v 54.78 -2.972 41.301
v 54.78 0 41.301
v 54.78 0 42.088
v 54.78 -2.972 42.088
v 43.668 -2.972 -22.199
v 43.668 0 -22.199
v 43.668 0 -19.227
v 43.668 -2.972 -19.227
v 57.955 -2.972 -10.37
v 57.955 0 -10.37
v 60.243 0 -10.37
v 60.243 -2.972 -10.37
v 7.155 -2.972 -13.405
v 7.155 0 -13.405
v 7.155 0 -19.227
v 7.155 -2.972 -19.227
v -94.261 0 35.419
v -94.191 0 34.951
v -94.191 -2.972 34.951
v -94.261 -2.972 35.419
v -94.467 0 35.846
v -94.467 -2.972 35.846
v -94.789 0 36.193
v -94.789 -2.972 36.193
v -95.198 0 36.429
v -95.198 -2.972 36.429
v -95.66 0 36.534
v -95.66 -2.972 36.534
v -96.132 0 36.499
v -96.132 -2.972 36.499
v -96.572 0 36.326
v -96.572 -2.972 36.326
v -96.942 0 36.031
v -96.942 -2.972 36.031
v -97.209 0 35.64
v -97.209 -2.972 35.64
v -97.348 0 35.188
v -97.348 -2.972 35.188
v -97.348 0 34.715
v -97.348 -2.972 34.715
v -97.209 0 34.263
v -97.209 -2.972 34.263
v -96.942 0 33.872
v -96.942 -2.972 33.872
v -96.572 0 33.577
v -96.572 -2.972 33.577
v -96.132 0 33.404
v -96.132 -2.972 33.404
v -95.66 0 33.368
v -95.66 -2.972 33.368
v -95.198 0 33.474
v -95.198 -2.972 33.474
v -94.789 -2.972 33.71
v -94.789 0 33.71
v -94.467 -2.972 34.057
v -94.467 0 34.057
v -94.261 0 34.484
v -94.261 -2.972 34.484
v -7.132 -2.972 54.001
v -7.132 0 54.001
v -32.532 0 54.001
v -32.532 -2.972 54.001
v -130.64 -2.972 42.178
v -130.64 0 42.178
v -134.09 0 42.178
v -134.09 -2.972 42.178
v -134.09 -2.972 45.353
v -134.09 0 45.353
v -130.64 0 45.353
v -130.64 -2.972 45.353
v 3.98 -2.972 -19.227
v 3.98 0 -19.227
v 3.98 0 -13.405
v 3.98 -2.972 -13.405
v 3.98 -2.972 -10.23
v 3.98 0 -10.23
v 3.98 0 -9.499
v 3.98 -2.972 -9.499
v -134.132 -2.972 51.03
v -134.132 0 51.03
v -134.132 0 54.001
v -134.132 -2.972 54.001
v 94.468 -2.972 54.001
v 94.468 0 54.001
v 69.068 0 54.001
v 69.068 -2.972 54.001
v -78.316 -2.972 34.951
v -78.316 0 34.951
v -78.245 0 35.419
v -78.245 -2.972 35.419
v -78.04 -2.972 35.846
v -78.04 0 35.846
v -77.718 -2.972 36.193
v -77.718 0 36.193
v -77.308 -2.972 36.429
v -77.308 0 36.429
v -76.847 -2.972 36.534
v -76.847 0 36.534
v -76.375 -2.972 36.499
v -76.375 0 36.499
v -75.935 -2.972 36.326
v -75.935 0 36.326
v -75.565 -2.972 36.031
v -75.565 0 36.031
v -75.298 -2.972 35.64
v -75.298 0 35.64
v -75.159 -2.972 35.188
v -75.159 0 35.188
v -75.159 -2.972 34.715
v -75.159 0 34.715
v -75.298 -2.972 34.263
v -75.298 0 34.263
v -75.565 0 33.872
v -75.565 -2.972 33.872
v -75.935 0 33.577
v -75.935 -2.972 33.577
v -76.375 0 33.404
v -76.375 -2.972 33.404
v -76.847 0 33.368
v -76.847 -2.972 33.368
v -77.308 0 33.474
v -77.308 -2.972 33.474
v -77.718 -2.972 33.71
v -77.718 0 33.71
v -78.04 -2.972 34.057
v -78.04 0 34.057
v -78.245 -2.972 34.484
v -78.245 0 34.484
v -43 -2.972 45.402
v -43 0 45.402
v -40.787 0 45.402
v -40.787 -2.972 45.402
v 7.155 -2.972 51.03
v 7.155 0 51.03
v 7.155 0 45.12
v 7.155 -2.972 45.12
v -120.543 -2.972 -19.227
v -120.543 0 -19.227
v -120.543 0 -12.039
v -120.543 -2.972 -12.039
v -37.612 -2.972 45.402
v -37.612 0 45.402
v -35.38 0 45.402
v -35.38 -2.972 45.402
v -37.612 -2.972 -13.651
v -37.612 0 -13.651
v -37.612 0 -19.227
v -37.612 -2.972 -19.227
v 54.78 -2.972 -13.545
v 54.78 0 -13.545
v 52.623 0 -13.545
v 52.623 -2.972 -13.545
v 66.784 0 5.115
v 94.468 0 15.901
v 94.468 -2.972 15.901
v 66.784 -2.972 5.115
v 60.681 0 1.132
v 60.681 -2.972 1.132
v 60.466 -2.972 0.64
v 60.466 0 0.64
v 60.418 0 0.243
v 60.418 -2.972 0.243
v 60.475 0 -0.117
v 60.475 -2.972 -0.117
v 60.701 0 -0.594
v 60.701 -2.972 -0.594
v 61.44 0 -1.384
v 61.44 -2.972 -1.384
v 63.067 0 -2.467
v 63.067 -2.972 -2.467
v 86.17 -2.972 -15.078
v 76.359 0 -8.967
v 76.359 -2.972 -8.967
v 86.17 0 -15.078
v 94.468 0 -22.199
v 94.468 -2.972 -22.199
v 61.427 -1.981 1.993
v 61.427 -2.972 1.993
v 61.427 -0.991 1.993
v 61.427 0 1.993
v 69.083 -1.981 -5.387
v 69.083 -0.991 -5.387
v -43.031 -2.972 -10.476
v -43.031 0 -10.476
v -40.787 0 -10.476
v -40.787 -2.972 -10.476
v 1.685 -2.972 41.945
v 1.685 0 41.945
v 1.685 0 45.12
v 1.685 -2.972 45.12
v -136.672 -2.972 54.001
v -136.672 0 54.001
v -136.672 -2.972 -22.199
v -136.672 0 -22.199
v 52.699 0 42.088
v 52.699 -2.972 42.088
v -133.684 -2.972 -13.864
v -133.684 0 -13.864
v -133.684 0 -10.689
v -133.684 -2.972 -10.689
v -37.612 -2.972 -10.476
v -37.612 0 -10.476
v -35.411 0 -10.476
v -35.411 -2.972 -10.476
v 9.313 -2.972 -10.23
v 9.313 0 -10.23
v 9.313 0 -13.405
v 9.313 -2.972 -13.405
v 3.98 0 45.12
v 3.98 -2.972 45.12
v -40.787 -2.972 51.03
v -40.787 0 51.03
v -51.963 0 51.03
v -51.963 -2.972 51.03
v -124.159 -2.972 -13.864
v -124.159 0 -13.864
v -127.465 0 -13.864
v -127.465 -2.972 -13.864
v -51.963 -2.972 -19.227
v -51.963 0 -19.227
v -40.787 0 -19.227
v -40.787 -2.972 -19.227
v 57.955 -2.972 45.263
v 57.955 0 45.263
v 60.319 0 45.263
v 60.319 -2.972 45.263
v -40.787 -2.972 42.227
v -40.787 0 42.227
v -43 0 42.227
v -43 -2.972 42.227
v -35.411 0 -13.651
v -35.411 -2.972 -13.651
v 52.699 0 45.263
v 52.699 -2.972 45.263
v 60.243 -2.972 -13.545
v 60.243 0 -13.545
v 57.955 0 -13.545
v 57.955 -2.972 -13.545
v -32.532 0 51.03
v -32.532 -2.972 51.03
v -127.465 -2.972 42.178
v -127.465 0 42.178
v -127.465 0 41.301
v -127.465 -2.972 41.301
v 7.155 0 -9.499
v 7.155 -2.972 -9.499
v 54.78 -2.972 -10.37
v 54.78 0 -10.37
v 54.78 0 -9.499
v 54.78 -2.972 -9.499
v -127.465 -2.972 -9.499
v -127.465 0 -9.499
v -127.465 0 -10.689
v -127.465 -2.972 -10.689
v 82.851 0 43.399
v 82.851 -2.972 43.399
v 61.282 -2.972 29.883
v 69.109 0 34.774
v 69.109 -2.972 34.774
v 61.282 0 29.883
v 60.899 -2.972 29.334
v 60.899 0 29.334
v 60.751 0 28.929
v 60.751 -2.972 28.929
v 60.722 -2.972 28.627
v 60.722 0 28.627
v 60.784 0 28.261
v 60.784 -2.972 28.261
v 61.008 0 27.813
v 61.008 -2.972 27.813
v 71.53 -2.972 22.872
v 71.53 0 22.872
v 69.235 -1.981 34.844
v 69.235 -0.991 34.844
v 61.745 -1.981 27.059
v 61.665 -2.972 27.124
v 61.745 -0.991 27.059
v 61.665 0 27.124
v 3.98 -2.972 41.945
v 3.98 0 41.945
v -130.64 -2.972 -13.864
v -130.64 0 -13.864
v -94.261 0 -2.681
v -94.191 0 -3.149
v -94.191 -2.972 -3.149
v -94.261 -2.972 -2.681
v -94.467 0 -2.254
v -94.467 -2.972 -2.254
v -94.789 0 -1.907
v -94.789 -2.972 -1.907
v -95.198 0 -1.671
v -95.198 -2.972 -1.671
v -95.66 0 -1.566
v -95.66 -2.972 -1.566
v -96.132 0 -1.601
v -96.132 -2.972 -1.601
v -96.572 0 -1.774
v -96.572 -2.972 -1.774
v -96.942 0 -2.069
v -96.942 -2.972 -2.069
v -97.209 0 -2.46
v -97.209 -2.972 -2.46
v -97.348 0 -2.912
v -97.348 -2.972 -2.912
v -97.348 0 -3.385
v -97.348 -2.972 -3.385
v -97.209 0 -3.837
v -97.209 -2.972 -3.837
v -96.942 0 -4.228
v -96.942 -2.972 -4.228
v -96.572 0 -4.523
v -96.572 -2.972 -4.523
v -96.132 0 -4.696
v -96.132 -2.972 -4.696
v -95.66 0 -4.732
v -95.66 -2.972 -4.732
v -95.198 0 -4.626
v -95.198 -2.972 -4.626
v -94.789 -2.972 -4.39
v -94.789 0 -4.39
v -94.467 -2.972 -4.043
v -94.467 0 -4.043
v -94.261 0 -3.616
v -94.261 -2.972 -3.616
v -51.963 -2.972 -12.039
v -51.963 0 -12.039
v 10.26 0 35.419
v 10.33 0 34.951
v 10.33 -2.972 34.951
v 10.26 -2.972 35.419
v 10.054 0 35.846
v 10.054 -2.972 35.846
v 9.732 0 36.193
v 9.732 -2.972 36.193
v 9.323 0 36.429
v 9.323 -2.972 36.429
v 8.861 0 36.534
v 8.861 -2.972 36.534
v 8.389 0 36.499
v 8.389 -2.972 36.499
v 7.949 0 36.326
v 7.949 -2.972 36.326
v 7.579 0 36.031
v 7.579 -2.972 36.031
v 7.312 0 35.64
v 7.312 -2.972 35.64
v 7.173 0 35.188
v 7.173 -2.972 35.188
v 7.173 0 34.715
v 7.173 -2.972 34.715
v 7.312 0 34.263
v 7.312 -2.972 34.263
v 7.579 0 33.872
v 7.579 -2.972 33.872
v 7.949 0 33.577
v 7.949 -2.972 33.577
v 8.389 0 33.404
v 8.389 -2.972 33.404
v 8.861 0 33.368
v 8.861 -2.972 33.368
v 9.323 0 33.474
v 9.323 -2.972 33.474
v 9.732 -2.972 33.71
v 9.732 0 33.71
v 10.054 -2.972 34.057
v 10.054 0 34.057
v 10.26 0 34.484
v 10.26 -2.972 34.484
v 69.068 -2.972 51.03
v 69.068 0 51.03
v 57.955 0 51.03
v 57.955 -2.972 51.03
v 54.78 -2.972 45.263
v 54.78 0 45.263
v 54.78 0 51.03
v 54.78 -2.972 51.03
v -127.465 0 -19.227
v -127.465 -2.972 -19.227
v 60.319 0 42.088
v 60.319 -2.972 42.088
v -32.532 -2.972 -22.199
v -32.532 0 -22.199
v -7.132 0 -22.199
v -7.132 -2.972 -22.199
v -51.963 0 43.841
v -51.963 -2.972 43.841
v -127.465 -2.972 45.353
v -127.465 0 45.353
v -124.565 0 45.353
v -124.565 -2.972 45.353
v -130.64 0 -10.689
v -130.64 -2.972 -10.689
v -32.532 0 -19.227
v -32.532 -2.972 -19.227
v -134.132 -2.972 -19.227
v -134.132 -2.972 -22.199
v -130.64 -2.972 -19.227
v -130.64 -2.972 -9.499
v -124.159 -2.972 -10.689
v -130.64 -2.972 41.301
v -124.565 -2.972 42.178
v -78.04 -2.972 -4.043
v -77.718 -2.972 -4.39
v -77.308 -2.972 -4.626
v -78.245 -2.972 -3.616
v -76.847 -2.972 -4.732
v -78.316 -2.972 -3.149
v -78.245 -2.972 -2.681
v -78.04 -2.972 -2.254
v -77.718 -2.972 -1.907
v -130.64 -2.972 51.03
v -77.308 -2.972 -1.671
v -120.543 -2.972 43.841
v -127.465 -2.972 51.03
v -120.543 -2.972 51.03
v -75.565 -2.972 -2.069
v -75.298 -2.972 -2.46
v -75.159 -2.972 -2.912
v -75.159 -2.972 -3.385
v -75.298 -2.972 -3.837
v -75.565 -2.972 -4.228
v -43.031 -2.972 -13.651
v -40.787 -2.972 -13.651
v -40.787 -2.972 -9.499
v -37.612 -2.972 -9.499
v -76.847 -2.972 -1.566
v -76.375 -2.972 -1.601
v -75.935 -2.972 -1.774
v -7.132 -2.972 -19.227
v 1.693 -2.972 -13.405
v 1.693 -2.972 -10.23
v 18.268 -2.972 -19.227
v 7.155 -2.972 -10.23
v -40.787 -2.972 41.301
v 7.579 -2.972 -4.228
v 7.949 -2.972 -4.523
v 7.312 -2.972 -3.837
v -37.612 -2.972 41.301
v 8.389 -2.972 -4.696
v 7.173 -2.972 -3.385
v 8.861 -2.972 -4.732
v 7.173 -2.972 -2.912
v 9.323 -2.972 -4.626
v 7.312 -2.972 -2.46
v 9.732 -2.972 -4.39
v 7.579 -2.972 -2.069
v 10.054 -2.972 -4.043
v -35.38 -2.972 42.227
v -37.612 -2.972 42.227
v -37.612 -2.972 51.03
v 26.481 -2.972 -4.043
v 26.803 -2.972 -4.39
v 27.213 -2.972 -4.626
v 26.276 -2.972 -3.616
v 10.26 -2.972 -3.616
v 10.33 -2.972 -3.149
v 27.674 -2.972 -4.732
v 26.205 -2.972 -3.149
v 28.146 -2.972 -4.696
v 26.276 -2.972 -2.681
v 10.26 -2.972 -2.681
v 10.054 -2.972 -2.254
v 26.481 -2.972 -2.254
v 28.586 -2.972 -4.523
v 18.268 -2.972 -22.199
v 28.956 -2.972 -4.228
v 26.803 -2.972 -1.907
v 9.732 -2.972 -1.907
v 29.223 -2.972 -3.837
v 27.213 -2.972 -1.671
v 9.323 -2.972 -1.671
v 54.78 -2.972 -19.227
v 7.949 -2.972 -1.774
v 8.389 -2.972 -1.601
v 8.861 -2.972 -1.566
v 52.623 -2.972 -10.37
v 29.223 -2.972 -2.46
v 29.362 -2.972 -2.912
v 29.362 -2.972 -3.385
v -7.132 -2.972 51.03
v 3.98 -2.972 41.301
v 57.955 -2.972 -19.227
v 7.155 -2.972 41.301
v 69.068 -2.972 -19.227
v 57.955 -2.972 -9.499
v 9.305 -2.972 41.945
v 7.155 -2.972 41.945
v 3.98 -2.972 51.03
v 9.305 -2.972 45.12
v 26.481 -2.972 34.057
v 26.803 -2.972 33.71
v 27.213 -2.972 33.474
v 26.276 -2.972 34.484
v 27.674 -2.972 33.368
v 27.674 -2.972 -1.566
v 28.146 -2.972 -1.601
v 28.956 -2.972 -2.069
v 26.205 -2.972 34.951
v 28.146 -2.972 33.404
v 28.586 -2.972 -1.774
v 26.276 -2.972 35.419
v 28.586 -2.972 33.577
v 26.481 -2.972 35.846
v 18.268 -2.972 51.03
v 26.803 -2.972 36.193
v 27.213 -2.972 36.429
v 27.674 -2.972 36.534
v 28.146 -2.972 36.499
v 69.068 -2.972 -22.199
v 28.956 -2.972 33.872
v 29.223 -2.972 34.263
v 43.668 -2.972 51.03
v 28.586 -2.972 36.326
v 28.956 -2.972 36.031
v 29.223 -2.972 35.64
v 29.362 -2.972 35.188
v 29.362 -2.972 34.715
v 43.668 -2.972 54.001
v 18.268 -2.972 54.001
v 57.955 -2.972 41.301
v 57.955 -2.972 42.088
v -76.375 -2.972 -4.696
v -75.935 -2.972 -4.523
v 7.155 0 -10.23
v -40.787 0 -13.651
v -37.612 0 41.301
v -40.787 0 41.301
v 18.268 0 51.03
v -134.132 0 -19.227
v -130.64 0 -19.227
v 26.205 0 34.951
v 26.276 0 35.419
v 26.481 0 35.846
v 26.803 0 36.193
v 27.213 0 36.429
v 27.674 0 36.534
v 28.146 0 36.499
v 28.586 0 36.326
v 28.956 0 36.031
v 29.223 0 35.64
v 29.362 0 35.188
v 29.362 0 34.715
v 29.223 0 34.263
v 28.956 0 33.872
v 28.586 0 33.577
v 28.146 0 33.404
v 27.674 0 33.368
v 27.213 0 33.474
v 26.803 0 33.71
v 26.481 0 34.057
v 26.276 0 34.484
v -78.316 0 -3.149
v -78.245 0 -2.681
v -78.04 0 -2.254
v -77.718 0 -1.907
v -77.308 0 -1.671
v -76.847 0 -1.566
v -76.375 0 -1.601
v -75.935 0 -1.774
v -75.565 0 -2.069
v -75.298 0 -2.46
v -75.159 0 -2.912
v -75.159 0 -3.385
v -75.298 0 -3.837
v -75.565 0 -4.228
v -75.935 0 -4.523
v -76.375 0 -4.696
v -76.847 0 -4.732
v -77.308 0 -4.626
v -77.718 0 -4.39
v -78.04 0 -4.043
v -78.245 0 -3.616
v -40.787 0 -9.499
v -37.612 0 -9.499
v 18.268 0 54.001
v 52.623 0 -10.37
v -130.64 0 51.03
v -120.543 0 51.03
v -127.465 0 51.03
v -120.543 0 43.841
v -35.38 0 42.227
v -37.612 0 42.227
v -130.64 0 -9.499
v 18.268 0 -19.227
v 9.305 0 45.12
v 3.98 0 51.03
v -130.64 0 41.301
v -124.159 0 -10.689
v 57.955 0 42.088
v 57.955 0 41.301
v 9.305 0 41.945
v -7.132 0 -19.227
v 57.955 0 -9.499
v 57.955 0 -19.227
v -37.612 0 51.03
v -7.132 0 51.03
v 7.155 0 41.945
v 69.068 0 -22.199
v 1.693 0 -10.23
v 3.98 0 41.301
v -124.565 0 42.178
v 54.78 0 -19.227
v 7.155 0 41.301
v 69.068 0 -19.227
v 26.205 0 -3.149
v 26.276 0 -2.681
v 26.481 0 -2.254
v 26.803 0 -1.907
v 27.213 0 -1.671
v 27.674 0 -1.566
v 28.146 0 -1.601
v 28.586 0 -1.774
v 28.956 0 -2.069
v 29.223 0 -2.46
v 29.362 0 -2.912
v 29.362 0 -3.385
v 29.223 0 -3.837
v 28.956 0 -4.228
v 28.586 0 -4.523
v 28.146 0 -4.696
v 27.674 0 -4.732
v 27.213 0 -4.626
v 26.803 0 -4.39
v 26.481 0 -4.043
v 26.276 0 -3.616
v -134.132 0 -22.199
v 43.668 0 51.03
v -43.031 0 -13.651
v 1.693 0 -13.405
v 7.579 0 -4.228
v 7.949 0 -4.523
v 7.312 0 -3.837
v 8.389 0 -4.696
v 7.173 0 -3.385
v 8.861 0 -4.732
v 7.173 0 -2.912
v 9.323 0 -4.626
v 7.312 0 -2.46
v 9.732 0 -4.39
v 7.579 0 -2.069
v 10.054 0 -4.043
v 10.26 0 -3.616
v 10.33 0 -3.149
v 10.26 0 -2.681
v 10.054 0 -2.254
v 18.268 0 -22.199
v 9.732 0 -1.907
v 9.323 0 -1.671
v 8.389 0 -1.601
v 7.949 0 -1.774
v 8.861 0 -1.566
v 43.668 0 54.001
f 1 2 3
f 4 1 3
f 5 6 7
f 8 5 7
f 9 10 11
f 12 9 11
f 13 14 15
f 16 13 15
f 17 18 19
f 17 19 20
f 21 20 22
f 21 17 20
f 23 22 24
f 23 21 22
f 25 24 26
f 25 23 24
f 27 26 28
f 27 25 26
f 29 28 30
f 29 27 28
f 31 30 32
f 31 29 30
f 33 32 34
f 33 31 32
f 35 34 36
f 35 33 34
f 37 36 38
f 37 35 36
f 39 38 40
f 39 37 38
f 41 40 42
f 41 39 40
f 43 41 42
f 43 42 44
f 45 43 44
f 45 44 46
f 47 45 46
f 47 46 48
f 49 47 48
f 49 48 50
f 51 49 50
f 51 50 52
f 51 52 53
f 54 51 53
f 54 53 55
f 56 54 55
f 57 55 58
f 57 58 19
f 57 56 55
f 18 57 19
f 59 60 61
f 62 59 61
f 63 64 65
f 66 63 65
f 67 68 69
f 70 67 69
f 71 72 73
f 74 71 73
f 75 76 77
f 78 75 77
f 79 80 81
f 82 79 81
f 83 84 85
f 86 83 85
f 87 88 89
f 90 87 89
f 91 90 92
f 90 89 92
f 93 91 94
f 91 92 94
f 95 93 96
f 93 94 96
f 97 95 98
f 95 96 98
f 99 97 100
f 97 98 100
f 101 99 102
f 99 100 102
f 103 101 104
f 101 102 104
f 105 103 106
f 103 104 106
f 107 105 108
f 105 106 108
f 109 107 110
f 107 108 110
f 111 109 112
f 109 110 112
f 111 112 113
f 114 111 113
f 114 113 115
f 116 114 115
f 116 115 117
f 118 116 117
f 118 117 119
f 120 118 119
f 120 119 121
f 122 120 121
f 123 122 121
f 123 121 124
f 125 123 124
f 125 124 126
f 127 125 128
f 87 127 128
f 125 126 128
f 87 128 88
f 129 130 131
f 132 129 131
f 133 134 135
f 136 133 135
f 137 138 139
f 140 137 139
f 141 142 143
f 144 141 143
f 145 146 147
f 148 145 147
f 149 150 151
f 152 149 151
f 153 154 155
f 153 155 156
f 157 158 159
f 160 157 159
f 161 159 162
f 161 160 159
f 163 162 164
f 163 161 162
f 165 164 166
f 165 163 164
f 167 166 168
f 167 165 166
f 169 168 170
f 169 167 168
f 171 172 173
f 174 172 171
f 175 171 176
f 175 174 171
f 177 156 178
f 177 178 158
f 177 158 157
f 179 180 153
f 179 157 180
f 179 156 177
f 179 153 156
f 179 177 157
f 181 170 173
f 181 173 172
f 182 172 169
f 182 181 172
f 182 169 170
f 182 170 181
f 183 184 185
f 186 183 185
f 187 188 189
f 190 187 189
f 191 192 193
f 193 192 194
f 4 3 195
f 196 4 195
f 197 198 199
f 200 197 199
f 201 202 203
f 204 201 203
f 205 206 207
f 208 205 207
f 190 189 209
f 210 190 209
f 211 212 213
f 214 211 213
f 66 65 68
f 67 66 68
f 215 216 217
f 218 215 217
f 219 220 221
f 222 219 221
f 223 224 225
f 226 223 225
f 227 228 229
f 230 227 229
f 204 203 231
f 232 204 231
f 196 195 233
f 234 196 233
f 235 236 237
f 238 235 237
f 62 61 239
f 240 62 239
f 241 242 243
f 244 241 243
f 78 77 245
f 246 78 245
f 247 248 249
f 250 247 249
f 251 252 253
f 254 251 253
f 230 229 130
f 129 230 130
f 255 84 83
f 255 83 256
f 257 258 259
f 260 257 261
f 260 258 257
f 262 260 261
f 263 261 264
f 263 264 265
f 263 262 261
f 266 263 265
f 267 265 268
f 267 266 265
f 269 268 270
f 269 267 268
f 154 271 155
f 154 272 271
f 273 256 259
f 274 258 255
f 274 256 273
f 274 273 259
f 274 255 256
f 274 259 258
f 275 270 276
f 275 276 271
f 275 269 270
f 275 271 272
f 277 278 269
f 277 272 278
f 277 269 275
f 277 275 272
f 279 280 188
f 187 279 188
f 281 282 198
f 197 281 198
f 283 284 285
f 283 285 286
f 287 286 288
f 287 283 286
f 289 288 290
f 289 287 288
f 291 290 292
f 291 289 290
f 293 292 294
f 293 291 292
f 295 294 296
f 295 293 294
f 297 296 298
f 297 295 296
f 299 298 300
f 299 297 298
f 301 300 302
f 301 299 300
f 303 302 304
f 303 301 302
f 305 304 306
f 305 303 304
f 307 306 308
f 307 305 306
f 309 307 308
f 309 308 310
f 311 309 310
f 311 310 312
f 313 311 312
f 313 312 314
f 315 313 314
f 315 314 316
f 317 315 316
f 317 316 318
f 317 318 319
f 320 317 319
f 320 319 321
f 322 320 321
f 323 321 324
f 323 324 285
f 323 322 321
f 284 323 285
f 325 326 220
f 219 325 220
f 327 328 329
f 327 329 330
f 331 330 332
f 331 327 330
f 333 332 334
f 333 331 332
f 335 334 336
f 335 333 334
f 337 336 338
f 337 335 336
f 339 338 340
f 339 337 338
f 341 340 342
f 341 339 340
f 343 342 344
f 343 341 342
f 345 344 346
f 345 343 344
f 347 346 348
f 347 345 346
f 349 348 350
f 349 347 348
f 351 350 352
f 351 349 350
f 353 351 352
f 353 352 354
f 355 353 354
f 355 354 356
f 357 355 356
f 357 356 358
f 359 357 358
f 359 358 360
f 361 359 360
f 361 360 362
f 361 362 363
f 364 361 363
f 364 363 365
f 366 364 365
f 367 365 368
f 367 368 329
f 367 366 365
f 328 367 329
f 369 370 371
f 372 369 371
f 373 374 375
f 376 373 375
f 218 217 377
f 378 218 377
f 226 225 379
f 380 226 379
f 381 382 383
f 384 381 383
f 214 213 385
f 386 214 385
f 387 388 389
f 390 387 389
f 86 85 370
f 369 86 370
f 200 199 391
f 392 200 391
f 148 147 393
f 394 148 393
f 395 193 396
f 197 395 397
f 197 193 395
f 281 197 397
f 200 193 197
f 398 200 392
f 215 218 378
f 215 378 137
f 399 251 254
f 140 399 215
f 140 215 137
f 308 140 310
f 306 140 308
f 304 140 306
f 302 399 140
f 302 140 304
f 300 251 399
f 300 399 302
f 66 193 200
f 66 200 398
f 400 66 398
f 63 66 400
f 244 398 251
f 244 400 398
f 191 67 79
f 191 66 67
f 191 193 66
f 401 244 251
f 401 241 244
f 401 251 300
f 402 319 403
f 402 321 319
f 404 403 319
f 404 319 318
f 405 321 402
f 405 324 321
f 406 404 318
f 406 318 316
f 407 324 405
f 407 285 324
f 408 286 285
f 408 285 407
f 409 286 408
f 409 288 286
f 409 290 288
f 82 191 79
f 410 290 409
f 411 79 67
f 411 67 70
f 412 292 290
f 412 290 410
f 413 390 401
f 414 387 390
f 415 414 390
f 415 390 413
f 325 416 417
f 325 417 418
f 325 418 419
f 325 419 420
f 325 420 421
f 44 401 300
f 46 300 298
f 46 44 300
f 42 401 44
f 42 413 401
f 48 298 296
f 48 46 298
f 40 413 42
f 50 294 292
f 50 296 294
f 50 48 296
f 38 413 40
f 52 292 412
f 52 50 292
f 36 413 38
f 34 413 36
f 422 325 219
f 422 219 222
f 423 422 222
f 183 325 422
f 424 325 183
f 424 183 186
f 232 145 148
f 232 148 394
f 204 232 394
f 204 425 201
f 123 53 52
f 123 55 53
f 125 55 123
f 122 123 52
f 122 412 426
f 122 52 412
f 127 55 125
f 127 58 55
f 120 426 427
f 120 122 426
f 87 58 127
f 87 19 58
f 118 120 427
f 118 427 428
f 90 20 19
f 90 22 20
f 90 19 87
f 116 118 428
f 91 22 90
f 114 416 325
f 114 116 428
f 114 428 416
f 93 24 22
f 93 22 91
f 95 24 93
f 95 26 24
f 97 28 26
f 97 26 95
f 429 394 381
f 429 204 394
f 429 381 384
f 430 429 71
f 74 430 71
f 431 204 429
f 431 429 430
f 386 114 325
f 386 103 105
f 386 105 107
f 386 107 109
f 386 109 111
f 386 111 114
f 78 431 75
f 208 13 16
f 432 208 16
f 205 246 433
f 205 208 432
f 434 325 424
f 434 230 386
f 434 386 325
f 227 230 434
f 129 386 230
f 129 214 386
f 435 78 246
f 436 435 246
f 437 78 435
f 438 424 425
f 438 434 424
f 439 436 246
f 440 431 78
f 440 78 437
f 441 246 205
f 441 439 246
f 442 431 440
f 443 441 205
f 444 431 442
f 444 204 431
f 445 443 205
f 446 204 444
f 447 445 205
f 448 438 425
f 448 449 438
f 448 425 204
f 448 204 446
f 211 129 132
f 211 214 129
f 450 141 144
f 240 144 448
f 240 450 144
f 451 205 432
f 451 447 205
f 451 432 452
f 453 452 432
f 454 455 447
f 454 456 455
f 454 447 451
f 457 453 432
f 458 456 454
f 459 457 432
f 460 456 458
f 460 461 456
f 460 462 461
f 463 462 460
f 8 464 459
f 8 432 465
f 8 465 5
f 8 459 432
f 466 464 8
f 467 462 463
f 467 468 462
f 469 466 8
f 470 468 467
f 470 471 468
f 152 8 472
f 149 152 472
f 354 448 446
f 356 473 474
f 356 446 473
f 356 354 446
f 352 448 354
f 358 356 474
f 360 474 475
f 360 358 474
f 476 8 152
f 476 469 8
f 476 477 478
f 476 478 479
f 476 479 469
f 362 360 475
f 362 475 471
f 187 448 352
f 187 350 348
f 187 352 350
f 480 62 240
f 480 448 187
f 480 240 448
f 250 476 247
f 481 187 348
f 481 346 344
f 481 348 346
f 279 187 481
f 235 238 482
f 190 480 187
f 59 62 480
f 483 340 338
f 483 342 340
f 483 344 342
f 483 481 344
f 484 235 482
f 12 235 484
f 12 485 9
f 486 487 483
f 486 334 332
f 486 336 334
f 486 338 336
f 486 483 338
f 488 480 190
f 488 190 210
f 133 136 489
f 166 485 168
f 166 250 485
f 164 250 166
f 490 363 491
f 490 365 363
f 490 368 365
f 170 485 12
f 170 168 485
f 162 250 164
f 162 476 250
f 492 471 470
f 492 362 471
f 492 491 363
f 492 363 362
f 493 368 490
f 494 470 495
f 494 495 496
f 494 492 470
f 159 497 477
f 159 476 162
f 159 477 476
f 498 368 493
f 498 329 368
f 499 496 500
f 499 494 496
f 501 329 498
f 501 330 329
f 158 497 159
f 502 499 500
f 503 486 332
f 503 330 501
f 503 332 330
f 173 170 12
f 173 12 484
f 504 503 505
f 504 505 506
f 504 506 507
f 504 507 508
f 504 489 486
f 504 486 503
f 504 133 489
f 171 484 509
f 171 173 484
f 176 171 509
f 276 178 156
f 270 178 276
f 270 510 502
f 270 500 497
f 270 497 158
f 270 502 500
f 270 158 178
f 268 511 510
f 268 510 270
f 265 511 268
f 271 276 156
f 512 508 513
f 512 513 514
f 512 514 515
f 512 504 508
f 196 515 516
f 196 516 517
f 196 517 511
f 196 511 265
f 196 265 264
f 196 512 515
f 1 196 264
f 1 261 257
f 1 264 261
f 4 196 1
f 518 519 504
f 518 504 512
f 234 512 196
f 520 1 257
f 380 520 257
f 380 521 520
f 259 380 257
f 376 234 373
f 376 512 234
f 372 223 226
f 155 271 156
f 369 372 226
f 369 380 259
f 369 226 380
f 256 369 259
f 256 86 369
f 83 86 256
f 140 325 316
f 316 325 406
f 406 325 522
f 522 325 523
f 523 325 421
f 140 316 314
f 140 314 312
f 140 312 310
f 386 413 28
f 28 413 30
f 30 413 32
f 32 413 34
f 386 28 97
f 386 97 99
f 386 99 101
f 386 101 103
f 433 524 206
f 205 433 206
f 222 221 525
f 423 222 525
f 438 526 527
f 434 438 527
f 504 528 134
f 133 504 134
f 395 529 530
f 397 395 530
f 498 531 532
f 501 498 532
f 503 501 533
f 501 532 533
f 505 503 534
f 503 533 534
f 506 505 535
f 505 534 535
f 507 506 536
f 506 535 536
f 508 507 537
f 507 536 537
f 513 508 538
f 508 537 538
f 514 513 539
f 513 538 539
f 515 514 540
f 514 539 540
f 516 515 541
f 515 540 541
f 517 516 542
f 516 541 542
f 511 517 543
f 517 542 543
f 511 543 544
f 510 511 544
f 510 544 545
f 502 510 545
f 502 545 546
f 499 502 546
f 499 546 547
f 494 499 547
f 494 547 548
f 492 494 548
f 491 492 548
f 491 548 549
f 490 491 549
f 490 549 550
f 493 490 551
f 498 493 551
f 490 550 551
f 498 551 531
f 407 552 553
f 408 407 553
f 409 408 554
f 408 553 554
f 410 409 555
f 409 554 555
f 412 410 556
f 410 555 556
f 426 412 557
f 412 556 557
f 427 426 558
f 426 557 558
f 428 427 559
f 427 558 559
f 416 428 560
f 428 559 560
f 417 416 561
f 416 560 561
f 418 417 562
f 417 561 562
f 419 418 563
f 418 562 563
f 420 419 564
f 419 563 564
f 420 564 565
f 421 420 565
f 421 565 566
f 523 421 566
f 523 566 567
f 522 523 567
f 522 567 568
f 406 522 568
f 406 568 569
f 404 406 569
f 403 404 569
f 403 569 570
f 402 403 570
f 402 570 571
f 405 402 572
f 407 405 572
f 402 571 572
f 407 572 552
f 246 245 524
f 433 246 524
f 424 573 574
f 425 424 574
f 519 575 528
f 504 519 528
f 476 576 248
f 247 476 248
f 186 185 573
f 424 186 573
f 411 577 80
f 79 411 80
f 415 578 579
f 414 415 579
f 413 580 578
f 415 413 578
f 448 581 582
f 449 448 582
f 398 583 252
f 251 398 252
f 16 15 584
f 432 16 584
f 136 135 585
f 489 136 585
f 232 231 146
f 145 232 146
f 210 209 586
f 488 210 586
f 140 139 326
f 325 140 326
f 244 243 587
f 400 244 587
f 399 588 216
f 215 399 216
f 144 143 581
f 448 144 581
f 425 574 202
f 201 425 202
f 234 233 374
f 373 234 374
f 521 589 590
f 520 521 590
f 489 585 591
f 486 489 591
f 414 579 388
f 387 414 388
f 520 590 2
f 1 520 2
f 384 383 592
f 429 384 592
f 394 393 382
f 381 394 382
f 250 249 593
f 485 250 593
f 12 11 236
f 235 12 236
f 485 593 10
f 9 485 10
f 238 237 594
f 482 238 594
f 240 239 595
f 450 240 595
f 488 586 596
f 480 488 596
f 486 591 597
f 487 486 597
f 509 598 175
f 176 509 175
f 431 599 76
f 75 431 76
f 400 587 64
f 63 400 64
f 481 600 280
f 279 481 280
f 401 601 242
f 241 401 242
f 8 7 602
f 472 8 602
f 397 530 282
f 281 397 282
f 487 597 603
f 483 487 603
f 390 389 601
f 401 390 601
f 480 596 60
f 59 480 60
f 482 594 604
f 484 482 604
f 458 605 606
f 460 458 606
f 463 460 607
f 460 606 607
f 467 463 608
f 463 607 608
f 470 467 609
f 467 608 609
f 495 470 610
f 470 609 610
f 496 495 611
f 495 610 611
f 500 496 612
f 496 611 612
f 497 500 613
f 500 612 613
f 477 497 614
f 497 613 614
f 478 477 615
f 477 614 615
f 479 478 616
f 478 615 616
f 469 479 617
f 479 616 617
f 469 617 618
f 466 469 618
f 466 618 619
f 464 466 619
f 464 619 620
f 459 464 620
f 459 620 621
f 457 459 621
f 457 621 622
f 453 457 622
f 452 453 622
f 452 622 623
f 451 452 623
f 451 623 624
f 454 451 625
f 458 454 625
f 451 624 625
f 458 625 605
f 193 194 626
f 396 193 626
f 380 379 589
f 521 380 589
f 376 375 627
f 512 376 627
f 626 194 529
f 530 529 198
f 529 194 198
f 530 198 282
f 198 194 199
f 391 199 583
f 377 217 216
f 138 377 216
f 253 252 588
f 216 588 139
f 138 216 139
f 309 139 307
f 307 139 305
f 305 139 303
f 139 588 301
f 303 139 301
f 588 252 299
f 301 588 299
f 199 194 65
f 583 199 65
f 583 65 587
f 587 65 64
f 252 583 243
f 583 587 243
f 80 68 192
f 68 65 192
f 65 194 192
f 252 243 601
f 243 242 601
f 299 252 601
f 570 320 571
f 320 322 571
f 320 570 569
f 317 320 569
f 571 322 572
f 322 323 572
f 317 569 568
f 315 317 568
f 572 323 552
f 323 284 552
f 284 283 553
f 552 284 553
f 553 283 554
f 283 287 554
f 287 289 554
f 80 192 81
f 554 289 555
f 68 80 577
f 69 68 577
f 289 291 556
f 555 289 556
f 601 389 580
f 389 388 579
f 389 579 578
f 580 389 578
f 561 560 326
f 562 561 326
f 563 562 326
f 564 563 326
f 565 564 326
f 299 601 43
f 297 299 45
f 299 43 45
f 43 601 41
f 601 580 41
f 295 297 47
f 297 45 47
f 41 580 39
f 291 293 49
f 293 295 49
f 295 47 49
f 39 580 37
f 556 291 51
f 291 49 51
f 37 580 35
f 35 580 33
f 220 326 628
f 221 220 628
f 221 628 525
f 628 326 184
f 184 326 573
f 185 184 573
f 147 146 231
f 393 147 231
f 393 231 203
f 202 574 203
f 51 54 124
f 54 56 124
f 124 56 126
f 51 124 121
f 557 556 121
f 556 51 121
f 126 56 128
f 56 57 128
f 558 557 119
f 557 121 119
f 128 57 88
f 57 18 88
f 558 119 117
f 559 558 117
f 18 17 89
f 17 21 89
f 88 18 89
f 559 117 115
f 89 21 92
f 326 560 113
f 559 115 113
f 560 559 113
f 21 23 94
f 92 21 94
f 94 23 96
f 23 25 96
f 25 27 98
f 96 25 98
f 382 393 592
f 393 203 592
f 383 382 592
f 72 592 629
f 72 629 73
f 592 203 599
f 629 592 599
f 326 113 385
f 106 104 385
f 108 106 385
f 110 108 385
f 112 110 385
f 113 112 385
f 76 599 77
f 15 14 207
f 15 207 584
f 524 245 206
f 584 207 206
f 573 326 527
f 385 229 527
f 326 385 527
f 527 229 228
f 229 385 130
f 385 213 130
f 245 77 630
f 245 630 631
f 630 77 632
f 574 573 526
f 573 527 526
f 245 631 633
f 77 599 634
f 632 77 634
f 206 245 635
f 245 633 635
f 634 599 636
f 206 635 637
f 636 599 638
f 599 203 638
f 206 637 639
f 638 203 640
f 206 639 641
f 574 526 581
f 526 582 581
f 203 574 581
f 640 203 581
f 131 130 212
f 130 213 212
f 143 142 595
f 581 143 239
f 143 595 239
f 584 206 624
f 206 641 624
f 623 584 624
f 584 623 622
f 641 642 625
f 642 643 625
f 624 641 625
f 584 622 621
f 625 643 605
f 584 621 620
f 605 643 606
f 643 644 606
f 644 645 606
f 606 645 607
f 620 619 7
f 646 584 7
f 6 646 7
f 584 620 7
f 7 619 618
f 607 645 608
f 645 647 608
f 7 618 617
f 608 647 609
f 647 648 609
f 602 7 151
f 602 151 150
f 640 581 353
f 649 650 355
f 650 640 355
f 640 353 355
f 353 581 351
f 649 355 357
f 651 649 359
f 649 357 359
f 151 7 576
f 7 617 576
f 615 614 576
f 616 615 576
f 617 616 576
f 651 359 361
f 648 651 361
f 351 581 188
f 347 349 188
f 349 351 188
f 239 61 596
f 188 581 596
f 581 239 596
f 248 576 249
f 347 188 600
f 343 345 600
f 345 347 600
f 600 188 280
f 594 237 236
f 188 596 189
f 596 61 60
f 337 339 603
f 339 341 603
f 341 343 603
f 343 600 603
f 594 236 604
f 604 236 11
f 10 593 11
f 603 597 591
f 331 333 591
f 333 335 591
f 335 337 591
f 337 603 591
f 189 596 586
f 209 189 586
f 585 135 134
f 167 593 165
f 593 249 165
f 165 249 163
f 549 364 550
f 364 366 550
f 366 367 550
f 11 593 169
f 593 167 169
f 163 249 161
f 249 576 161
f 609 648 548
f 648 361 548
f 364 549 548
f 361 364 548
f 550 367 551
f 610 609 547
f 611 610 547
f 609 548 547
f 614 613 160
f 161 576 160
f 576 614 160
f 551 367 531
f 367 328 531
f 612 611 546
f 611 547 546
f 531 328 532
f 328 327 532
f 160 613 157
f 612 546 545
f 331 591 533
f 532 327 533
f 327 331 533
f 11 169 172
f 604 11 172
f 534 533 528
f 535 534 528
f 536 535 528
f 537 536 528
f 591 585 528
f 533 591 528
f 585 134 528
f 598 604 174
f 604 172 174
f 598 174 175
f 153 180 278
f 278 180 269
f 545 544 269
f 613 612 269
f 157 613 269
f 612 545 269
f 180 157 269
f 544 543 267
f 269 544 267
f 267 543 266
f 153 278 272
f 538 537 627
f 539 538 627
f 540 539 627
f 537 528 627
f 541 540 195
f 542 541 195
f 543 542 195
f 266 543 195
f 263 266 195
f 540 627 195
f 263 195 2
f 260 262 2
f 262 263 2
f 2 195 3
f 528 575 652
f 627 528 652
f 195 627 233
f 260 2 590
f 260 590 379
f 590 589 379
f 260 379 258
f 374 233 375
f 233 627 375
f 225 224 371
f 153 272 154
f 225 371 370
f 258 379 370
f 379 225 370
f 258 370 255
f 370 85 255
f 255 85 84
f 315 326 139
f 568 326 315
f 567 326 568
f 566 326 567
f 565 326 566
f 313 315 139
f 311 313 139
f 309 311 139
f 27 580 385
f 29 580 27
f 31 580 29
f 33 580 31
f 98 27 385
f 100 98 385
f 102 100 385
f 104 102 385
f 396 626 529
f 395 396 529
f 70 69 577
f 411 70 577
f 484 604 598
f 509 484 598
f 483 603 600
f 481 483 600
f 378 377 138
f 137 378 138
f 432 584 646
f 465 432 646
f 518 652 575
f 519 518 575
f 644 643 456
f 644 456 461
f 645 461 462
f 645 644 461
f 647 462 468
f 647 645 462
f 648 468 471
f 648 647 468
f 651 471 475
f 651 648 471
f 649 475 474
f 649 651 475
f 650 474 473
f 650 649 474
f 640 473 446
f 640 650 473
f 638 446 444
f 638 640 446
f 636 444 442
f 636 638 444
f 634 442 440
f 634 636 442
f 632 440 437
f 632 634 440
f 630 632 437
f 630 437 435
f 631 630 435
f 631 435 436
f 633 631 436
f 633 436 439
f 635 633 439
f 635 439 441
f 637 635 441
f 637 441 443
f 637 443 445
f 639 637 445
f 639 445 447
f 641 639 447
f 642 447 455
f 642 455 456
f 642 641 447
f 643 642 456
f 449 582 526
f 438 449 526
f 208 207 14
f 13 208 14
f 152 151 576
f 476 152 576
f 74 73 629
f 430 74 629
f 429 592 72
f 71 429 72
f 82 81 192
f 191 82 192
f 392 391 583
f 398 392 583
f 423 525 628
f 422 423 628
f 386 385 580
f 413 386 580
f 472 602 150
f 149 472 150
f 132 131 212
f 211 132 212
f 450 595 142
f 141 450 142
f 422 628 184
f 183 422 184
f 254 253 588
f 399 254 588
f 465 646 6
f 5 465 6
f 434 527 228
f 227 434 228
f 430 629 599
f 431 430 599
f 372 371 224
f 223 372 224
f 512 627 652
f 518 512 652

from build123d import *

# Parameters (mm, degrees)
F0_R     = 1.5875
F0_W     = 159.1020785272
F0_H     = 25.4
F1_DEPTH = 2.9718


# Not quite as in the source:
# - a feature names something its author has since deleted; it is built from what else it names


with BuildPart() as f1:
    # F0 (on Front) → F1 (new body)
    with BuildSketch(Plane.XZ):
        Polygon((-134.1324669933, 51.0296365122), (-134.1324669933, 54.0014365122), (-136.6724669933, 54.0014365122), (-136.6724669933, -22.1985634878), (-134.1324669933, -22.1985634878), (-134.1324669933, -19.2267634878), align=None)
        with BuildLine():
            Line((-130.6399669933, 51.0296365122), (-134.1324669933, 51.0296365122))
            Line((-134.1324669933, 51.0296365122), (-134.1324669933, -19.2267634878))
            Line((-134.1324669933, -19.2267634878), (-130.6399669933, -19.2267634878))
            Line((-130.6399669933, -19.2267634878), (-130.6399669933, -13.8642910361))
            Line((-130.6399669933, -13.8642910361), (-133.683725667, -13.8642910361))
            Line((-133.683725667, -13.8642910361), (-133.683725667, -10.6892910361))
            Line((-133.683725667, -10.6892910361), (-130.6399669933, -10.6892910361))
            Line((-130.6399669933, -10.6892910361), (-130.6399669933, -9.4985634878))
            Line((-130.6399669933, -9.4985634878), (-127.4649669933, -9.4985634878))
            Line((-127.4649669933, -9.4985634878), (-127.4649669933, -10.6892910361))
            Line((-127.4649669933, -10.6892910361), (-124.158725667, -10.6892910361))
            Line((-124.158725667, -10.6892910361), (-124.158725667, -13.8642910361))
            Line((-124.158725667, -13.8642910361), (-127.4649669933, -13.8642910361))
            Line((-127.4649669933, -13.8642910361), (-127.4649669933, -19.2267634878))
            Line((-127.4649669933, -19.2267634878), (-120.5434669933, -19.2267634878))
            Line((-120.5434669933, -19.2267634878), (-120.5434669933, -12.0385634878))
            Line((-120.5434669933, -12.0385634878), (-51.9634669933, -12.0385634878))
            Line((-51.9634669933, -12.0385634878), (-51.9634669933, -19.2267634878))
            Line((-51.9634669933, -19.2267634878), (-40.7874669933, -19.2267634878))
            Line((-40.7874669933, -19.2267634878), (-40.7874669933, -13.650716418))
            Line((-40.7874669933, -13.650716418), (-43.0311936414, -13.650716418))
            Line((-43.0311936414, -13.650716418), (-43.0311936414, -10.475716418))
            Line((-43.0311936414, -10.475716418), (-40.7874669933, -10.475716418))
            Line((-40.7874669933, -10.475716418), (-40.7874669933, -9.4985634878))
            Line((-40.7874669933, -9.4985634878), (-37.6124669933, -9.4985634878))
            Line((-37.6124669933, -9.4985634878), (-37.6124669933, -10.475716418))
            Line((-37.6124669933, -10.475716418), (-35.4111936414, -10.475716418))
            Line((-35.4111936414, -10.475716418), (-35.4111936414, -13.650716418))
            Line((-35.4111936414, -13.650716418), (-37.6124669933, -13.650716418))
            Line((-37.6124669933, -13.650716418), (-37.6124669933, -19.2267634878))
            Line((-37.6124669933, -19.2267634878), (-32.5324669933, -19.2267634878))
            Line((-32.5324669933, -19.2267634878), (-32.5324669933, -22.1985634878))
            Line((-32.5324669933, -22.1985634878), (-7.1324669933, -22.1985634878))
            Line((-7.1324669933, -22.1985634878), (-7.1324669933, -19.2267634878))
            Line((-7.1324669933, -19.2267634878), (3.9800330067, -19.2267634878))
            Line((3.9800330067, -19.2267634878), (3.9800330067, -13.4051909164))
            Line((3.9800330067, -13.4051909164), (1.6932926612, -13.4051909164))
            Line((1.6932926612, -13.4051909164), (1.6932926612, -10.2301909164))
            Line((1.6932926612, -10.2301909164), (3.9800330067, -10.2301909164))
            Line((3.9800330067, -10.2301909164), (3.9800330067, -9.4985634878))
            Line((3.9800330067, -9.4985634878), (7.1550330067, -9.4985634878))
            Line((7.1550330067, -9.4985634878), (7.1550330067, -10.2301909164))
            Line((7.1550330067, -10.2301909164), (9.3132926612, -10.2301909164))
            Line((9.3132926612, -10.2301909164), (9.3132926612, -13.4051909164))
            Line((9.3132926612, -13.4051909164), (7.1550330067, -13.4051909164))
            Line((7.1550330067, -13.4051909164), (7.1550330067, -19.2267634878))
            Line((7.1550330067, -19.2267634878), (18.2675330067, -19.2267634878))
            Line((18.2675330067, -19.2267634878), (18.2675330067, -22.1985634878))
            Line((18.2675330067, -22.1985634878), (43.6675330067, -22.1985634878))
            Line((43.6675330067, -22.1985634878), (43.6675330067, -19.2267634878))
            Line((43.6675330067, -19.2267634878), (54.7800330067, -19.2267634878))
            Line((54.7800330067, -19.2267634878), (54.7800330067, -13.545062393))
            Line((54.7800330067, -13.545062393), (52.6228938252, -13.545062393))
            Line((52.6228938252, -13.545062393), (52.6228938252, -10.370062393))
            Line((52.6228938252, -10.370062393), (54.7800330067, -10.370062393))
            Line((54.7800330067, -10.370062393), (54.7800330067, -9.4985634878))
            Line((54.7800330067, -9.4985634878), (57.9550330067, -9.4985634878))
            Line((57.9550330067, -9.4985634878), (57.9550330067, -10.370062393))
            Line((57.9550330067, -10.370062393), (60.2428938252, -10.370062393))
            Line((60.2428938252, -10.370062393), (60.2428938252, -13.545062393))
            Line((60.2428938252, -13.545062393), (57.9550330067, -13.545062393))
            Line((57.9550330067, -13.545062393), (57.9550330067, -19.2267634878))
            Line((57.9550330067, -19.2267634878), (69.0675330067, -19.2267634878))
            Line((69.0675330067, -19.2267634878), (69.0675330067, -22.1985634878))
            Line((69.0675330067, -22.1985634878), (94.4675330067, -22.1985634878))
            add(Edge.make_bspline(
                [(94.4675330067, 15.9014365122), (33.4221309805, -6.5926179945), (67.8742191577, 4.6496394366), (94.4675330067, -22.1985634878)],
                knots=[0, 0, 0, 0, 38.1, 38.1, 38.1, 38.1], degree=3))
            add(Edge.make_bspline(
                [(94.4675330067, 54.0014365122), (67.8547954941, 24.2413681328), (34.147437551, 33.6619180903), (94.4675330067, 15.9014365122)],
                knots=[0, 0, 0, 0, 38.1, 38.1, 38.1, 38.1], degree=3))
            Line((94.4675330067, 54.0014365122), (69.0675330067, 54.0014365122))
            Line((69.0675330067, 54.0014365122), (69.0675330067, 51.0296365122))
            Line((69.0675330067, 51.0296365122), (57.9550330067, 51.0296365122))
            Line((57.9550330067, 51.0296365122), (57.9550330067, 45.263365978))
            Line((57.9550330067, 45.263365978), (60.3188354051, 45.263365978))
            Line((60.3188354051, 45.263365978), (60.3188354051, 42.088365978))
            Line((60.3188354051, 42.088365978), (57.9550330067, 42.088365978))
            Line((57.9550330067, 42.088365978), (57.9550330067, 41.3014365122))
            Line((57.9550330067, 41.3014365122), (54.7800330067, 41.3014365122))
            Line((54.7800330067, 41.3014365122), (54.7800330067, 42.088365978))
            Line((54.7800330067, 42.088365978), (52.6988354051, 42.088365978))
            Line((52.6988354051, 42.088365978), (52.6988354051, 45.263365978))
            Line((52.6988354051, 45.263365978), (54.7800330067, 45.263365978))
            Line((54.7800330067, 45.263365978), (54.7800330067, 51.0296365122))
            Line((54.7800330067, 51.0296365122), (43.6675330067, 51.0296365122))
            Line((43.6675330067, 51.0296365122), (43.6675330067, 54.0014365122))
            Line((43.6675330067, 54.0014365122), (18.2675330067, 54.0014365122))
            Line((18.2675330067, 54.0014365122), (18.2675330067, 51.0296365122))
            Line((18.2675330067, 51.0296365122), (7.1550330067, 51.0296365122))
            Line((7.1550330067, 51.0296365122), (7.1550330067, 45.1199758291))
            Line((7.1550330067, 45.1199758291), (9.3046905002, 45.1199758291))
            Line((9.3046905002, 45.1199758291), (9.3046905002, 41.9449758291))
            Line((9.3046905002, 41.9449758291), (7.1550330067, 41.9449758291))
            Line((7.1550330067, 41.9449758291), (7.1550330067, 41.3014365122))
            Line((7.1550330067, 41.3014365122), (3.9800330067, 41.3014365122))
            Line((3.9800330067, 41.3014365122), (3.9800330067, 41.9449758291))
            Line((3.9800330067, 41.9449758291), (1.6846905002, 41.9449758291))
            Line((1.6846905002, 41.9449758291), (1.6846905002, 45.1199758291))
            Line((1.6846905002, 45.1199758291), (3.9800330067, 45.1199758291))
            Line((3.9800330067, 45.1199758291), (3.9800330067, 51.0296365122))
            Line((3.9800330067, 51.0296365122), (-7.1324669933, 51.0296365122))
            Line((-7.1324669933, 51.0296365122), (-7.1324669933, 54.0014365122))
            Line((-7.1324669933, 54.0014365122), (-32.5324669933, 54.0014365122))
            Line((-32.5324669933, 54.0014365122), (-32.5324669933, 51.0296365122))
            Line((-32.5324669933, 51.0296365122), (-37.6124669933, 51.0296365122))
            Line((-37.6124669933, 51.0296365122), (-37.6124669933, 45.4024068505))
            Line((-37.6124669933, 45.4024068505), (-35.3795323992, 45.4024068505))
            Line((-35.3795323992, 45.4024068505), (-35.3795323992, 42.2274068505))
            Line((-35.3795323992, 42.2274068505), (-37.6124669933, 42.2274068505))
            Line((-37.6124669933, 42.2274068505), (-37.6124669933, 41.3014365122))
            Line((-37.6124669933, 41.3014365122), (-40.7874669933, 41.3014365122))
            Line((-40.7874669933, 41.3014365122), (-40.7874669933, 42.2274068505))
            Line((-40.7874669933, 42.2274068505), (-42.9995323992, 42.2274068505))
            Line((-42.9995323992, 42.2274068505), (-42.9995323992, 45.4024068505))
            Line((-42.9995323992, 45.4024068505), (-40.7874669933, 45.4024068505))
            Line((-40.7874669933, 45.4024068505), (-40.7874669933, 51.0296365122))
            Line((-40.7874669933, 51.0296365122), (-51.9634669933, 51.0296365122))
            Line((-51.9634669933, 51.0296365122), (-51.9634669933, 43.8414365122))
            Line((-51.9634669933, 43.8414365122), (-120.5434669933, 43.8414365122))
            Line((-120.5434669933, 43.8414365122), (-120.5434669933, 51.0296365122))
            Line((-120.5434669933, 51.0296365122), (-127.4649669933, 51.0296365122))
            Line((-127.4649669933, 51.0296365122), (-127.4649669933, 45.3533373266))
            Line((-127.4649669933, 45.3533373266), (-124.5652367949, 45.3533373266))
            Line((-124.5652367949, 45.3533373266), (-124.5652367949, 42.1783373266))
            Line((-124.5652367949, 42.1783373266), (-127.4649669933, 42.1783373266))
            Line((-127.4649669933, 42.1783373266), (-127.4649669933, 41.3014365122))
            Line((-127.4649669933, 41.3014365122), (-130.6399669933, 41.3014365122))
            Line((-130.6399669933, 41.3014365122), (-130.6399669933, 42.1783373266))
            Line((-130.6399669933, 42.1783373266), (-134.0902367949, 42.1783373266))
            Line((-134.0902367949, 42.1783373266), (-134.0902367949, 45.3533373266))
            Line((-134.0902367949, 45.3533373266), (-130.6399669933, 45.3533373266))
            Line((-130.6399669933, 45.3533373266), (-130.6399669933, 51.0296365122))
        make_face()
        with Locations((-95.7784669933, -3.1485634878)):
            Circle(F0_R, mode=Mode.SUBTRACT)
        with BuildLine():
            ThreePointArc((-75.1409669933, -3.1485634878), (-76.7284669933, -4.7360634878), (-78.3159669933, -3.1485634878))
            ThreePointArc((-78.3159669933, -3.1485634878), (-76.7284669933, -1.5610634878), (-75.1409669933, -3.1485634878))
        make_face(mode=Mode.SUBTRACT)
        with Locations((8.7425330067, -3.1485634878)):
            Circle(F0_R, mode=Mode.SUBTRACT)
        with BuildLine():
            ThreePointArc((29.3800330067, -3.1485634878), (27.7925330067, -4.7360634878), (26.2050330067, -3.1485634878))
            ThreePointArc((26.2050330067, -3.1485634878), (27.7925330067, -1.5610634878), (29.3800330067, -3.1485634878))
        make_face(mode=Mode.SUBTRACT)
        with Locations((-29.1814277297, 15.9014365122)):
            Rectangle(F0_W, F0_H, mode=Mode.SUBTRACT)
        with Locations((-95.7784669933, 34.9514365122)):
            Circle(F0_R, mode=Mode.SUBTRACT)
        with BuildLine():
            ThreePointArc((-75.1409669933, 34.9514365122), (-76.7284669933, 33.3639365122), (-78.3159669933, 34.9514365122))
            ThreePointArc((-78.3159669933, 34.9514365122), (-76.7284669933, 36.5389365122), (-75.1409669933, 34.9514365122))
        make_face(mode=Mode.SUBTRACT)
        with Locations((8.7425330067, 34.9514365122)):
            Circle(F0_R, mode=Mode.SUBTRACT)
        with BuildLine():
            ThreePointArc((29.3800330067, 34.9514365122), (27.7925330067, 33.3639365122), (26.2050330067, 34.9514365122))
            ThreePointArc((26.2050330067, 34.9514365122), (27.7925330067, 36.5389365122), (29.3800330067, 34.9514365122))
        make_face(mode=Mode.SUBTRACT)
        with Locations((-29.1814277297, 15.9014365122)):
            Rectangle(F0_W, F0_H)
    extrude(amount=F1_DEPTH)


solid = f1.part
